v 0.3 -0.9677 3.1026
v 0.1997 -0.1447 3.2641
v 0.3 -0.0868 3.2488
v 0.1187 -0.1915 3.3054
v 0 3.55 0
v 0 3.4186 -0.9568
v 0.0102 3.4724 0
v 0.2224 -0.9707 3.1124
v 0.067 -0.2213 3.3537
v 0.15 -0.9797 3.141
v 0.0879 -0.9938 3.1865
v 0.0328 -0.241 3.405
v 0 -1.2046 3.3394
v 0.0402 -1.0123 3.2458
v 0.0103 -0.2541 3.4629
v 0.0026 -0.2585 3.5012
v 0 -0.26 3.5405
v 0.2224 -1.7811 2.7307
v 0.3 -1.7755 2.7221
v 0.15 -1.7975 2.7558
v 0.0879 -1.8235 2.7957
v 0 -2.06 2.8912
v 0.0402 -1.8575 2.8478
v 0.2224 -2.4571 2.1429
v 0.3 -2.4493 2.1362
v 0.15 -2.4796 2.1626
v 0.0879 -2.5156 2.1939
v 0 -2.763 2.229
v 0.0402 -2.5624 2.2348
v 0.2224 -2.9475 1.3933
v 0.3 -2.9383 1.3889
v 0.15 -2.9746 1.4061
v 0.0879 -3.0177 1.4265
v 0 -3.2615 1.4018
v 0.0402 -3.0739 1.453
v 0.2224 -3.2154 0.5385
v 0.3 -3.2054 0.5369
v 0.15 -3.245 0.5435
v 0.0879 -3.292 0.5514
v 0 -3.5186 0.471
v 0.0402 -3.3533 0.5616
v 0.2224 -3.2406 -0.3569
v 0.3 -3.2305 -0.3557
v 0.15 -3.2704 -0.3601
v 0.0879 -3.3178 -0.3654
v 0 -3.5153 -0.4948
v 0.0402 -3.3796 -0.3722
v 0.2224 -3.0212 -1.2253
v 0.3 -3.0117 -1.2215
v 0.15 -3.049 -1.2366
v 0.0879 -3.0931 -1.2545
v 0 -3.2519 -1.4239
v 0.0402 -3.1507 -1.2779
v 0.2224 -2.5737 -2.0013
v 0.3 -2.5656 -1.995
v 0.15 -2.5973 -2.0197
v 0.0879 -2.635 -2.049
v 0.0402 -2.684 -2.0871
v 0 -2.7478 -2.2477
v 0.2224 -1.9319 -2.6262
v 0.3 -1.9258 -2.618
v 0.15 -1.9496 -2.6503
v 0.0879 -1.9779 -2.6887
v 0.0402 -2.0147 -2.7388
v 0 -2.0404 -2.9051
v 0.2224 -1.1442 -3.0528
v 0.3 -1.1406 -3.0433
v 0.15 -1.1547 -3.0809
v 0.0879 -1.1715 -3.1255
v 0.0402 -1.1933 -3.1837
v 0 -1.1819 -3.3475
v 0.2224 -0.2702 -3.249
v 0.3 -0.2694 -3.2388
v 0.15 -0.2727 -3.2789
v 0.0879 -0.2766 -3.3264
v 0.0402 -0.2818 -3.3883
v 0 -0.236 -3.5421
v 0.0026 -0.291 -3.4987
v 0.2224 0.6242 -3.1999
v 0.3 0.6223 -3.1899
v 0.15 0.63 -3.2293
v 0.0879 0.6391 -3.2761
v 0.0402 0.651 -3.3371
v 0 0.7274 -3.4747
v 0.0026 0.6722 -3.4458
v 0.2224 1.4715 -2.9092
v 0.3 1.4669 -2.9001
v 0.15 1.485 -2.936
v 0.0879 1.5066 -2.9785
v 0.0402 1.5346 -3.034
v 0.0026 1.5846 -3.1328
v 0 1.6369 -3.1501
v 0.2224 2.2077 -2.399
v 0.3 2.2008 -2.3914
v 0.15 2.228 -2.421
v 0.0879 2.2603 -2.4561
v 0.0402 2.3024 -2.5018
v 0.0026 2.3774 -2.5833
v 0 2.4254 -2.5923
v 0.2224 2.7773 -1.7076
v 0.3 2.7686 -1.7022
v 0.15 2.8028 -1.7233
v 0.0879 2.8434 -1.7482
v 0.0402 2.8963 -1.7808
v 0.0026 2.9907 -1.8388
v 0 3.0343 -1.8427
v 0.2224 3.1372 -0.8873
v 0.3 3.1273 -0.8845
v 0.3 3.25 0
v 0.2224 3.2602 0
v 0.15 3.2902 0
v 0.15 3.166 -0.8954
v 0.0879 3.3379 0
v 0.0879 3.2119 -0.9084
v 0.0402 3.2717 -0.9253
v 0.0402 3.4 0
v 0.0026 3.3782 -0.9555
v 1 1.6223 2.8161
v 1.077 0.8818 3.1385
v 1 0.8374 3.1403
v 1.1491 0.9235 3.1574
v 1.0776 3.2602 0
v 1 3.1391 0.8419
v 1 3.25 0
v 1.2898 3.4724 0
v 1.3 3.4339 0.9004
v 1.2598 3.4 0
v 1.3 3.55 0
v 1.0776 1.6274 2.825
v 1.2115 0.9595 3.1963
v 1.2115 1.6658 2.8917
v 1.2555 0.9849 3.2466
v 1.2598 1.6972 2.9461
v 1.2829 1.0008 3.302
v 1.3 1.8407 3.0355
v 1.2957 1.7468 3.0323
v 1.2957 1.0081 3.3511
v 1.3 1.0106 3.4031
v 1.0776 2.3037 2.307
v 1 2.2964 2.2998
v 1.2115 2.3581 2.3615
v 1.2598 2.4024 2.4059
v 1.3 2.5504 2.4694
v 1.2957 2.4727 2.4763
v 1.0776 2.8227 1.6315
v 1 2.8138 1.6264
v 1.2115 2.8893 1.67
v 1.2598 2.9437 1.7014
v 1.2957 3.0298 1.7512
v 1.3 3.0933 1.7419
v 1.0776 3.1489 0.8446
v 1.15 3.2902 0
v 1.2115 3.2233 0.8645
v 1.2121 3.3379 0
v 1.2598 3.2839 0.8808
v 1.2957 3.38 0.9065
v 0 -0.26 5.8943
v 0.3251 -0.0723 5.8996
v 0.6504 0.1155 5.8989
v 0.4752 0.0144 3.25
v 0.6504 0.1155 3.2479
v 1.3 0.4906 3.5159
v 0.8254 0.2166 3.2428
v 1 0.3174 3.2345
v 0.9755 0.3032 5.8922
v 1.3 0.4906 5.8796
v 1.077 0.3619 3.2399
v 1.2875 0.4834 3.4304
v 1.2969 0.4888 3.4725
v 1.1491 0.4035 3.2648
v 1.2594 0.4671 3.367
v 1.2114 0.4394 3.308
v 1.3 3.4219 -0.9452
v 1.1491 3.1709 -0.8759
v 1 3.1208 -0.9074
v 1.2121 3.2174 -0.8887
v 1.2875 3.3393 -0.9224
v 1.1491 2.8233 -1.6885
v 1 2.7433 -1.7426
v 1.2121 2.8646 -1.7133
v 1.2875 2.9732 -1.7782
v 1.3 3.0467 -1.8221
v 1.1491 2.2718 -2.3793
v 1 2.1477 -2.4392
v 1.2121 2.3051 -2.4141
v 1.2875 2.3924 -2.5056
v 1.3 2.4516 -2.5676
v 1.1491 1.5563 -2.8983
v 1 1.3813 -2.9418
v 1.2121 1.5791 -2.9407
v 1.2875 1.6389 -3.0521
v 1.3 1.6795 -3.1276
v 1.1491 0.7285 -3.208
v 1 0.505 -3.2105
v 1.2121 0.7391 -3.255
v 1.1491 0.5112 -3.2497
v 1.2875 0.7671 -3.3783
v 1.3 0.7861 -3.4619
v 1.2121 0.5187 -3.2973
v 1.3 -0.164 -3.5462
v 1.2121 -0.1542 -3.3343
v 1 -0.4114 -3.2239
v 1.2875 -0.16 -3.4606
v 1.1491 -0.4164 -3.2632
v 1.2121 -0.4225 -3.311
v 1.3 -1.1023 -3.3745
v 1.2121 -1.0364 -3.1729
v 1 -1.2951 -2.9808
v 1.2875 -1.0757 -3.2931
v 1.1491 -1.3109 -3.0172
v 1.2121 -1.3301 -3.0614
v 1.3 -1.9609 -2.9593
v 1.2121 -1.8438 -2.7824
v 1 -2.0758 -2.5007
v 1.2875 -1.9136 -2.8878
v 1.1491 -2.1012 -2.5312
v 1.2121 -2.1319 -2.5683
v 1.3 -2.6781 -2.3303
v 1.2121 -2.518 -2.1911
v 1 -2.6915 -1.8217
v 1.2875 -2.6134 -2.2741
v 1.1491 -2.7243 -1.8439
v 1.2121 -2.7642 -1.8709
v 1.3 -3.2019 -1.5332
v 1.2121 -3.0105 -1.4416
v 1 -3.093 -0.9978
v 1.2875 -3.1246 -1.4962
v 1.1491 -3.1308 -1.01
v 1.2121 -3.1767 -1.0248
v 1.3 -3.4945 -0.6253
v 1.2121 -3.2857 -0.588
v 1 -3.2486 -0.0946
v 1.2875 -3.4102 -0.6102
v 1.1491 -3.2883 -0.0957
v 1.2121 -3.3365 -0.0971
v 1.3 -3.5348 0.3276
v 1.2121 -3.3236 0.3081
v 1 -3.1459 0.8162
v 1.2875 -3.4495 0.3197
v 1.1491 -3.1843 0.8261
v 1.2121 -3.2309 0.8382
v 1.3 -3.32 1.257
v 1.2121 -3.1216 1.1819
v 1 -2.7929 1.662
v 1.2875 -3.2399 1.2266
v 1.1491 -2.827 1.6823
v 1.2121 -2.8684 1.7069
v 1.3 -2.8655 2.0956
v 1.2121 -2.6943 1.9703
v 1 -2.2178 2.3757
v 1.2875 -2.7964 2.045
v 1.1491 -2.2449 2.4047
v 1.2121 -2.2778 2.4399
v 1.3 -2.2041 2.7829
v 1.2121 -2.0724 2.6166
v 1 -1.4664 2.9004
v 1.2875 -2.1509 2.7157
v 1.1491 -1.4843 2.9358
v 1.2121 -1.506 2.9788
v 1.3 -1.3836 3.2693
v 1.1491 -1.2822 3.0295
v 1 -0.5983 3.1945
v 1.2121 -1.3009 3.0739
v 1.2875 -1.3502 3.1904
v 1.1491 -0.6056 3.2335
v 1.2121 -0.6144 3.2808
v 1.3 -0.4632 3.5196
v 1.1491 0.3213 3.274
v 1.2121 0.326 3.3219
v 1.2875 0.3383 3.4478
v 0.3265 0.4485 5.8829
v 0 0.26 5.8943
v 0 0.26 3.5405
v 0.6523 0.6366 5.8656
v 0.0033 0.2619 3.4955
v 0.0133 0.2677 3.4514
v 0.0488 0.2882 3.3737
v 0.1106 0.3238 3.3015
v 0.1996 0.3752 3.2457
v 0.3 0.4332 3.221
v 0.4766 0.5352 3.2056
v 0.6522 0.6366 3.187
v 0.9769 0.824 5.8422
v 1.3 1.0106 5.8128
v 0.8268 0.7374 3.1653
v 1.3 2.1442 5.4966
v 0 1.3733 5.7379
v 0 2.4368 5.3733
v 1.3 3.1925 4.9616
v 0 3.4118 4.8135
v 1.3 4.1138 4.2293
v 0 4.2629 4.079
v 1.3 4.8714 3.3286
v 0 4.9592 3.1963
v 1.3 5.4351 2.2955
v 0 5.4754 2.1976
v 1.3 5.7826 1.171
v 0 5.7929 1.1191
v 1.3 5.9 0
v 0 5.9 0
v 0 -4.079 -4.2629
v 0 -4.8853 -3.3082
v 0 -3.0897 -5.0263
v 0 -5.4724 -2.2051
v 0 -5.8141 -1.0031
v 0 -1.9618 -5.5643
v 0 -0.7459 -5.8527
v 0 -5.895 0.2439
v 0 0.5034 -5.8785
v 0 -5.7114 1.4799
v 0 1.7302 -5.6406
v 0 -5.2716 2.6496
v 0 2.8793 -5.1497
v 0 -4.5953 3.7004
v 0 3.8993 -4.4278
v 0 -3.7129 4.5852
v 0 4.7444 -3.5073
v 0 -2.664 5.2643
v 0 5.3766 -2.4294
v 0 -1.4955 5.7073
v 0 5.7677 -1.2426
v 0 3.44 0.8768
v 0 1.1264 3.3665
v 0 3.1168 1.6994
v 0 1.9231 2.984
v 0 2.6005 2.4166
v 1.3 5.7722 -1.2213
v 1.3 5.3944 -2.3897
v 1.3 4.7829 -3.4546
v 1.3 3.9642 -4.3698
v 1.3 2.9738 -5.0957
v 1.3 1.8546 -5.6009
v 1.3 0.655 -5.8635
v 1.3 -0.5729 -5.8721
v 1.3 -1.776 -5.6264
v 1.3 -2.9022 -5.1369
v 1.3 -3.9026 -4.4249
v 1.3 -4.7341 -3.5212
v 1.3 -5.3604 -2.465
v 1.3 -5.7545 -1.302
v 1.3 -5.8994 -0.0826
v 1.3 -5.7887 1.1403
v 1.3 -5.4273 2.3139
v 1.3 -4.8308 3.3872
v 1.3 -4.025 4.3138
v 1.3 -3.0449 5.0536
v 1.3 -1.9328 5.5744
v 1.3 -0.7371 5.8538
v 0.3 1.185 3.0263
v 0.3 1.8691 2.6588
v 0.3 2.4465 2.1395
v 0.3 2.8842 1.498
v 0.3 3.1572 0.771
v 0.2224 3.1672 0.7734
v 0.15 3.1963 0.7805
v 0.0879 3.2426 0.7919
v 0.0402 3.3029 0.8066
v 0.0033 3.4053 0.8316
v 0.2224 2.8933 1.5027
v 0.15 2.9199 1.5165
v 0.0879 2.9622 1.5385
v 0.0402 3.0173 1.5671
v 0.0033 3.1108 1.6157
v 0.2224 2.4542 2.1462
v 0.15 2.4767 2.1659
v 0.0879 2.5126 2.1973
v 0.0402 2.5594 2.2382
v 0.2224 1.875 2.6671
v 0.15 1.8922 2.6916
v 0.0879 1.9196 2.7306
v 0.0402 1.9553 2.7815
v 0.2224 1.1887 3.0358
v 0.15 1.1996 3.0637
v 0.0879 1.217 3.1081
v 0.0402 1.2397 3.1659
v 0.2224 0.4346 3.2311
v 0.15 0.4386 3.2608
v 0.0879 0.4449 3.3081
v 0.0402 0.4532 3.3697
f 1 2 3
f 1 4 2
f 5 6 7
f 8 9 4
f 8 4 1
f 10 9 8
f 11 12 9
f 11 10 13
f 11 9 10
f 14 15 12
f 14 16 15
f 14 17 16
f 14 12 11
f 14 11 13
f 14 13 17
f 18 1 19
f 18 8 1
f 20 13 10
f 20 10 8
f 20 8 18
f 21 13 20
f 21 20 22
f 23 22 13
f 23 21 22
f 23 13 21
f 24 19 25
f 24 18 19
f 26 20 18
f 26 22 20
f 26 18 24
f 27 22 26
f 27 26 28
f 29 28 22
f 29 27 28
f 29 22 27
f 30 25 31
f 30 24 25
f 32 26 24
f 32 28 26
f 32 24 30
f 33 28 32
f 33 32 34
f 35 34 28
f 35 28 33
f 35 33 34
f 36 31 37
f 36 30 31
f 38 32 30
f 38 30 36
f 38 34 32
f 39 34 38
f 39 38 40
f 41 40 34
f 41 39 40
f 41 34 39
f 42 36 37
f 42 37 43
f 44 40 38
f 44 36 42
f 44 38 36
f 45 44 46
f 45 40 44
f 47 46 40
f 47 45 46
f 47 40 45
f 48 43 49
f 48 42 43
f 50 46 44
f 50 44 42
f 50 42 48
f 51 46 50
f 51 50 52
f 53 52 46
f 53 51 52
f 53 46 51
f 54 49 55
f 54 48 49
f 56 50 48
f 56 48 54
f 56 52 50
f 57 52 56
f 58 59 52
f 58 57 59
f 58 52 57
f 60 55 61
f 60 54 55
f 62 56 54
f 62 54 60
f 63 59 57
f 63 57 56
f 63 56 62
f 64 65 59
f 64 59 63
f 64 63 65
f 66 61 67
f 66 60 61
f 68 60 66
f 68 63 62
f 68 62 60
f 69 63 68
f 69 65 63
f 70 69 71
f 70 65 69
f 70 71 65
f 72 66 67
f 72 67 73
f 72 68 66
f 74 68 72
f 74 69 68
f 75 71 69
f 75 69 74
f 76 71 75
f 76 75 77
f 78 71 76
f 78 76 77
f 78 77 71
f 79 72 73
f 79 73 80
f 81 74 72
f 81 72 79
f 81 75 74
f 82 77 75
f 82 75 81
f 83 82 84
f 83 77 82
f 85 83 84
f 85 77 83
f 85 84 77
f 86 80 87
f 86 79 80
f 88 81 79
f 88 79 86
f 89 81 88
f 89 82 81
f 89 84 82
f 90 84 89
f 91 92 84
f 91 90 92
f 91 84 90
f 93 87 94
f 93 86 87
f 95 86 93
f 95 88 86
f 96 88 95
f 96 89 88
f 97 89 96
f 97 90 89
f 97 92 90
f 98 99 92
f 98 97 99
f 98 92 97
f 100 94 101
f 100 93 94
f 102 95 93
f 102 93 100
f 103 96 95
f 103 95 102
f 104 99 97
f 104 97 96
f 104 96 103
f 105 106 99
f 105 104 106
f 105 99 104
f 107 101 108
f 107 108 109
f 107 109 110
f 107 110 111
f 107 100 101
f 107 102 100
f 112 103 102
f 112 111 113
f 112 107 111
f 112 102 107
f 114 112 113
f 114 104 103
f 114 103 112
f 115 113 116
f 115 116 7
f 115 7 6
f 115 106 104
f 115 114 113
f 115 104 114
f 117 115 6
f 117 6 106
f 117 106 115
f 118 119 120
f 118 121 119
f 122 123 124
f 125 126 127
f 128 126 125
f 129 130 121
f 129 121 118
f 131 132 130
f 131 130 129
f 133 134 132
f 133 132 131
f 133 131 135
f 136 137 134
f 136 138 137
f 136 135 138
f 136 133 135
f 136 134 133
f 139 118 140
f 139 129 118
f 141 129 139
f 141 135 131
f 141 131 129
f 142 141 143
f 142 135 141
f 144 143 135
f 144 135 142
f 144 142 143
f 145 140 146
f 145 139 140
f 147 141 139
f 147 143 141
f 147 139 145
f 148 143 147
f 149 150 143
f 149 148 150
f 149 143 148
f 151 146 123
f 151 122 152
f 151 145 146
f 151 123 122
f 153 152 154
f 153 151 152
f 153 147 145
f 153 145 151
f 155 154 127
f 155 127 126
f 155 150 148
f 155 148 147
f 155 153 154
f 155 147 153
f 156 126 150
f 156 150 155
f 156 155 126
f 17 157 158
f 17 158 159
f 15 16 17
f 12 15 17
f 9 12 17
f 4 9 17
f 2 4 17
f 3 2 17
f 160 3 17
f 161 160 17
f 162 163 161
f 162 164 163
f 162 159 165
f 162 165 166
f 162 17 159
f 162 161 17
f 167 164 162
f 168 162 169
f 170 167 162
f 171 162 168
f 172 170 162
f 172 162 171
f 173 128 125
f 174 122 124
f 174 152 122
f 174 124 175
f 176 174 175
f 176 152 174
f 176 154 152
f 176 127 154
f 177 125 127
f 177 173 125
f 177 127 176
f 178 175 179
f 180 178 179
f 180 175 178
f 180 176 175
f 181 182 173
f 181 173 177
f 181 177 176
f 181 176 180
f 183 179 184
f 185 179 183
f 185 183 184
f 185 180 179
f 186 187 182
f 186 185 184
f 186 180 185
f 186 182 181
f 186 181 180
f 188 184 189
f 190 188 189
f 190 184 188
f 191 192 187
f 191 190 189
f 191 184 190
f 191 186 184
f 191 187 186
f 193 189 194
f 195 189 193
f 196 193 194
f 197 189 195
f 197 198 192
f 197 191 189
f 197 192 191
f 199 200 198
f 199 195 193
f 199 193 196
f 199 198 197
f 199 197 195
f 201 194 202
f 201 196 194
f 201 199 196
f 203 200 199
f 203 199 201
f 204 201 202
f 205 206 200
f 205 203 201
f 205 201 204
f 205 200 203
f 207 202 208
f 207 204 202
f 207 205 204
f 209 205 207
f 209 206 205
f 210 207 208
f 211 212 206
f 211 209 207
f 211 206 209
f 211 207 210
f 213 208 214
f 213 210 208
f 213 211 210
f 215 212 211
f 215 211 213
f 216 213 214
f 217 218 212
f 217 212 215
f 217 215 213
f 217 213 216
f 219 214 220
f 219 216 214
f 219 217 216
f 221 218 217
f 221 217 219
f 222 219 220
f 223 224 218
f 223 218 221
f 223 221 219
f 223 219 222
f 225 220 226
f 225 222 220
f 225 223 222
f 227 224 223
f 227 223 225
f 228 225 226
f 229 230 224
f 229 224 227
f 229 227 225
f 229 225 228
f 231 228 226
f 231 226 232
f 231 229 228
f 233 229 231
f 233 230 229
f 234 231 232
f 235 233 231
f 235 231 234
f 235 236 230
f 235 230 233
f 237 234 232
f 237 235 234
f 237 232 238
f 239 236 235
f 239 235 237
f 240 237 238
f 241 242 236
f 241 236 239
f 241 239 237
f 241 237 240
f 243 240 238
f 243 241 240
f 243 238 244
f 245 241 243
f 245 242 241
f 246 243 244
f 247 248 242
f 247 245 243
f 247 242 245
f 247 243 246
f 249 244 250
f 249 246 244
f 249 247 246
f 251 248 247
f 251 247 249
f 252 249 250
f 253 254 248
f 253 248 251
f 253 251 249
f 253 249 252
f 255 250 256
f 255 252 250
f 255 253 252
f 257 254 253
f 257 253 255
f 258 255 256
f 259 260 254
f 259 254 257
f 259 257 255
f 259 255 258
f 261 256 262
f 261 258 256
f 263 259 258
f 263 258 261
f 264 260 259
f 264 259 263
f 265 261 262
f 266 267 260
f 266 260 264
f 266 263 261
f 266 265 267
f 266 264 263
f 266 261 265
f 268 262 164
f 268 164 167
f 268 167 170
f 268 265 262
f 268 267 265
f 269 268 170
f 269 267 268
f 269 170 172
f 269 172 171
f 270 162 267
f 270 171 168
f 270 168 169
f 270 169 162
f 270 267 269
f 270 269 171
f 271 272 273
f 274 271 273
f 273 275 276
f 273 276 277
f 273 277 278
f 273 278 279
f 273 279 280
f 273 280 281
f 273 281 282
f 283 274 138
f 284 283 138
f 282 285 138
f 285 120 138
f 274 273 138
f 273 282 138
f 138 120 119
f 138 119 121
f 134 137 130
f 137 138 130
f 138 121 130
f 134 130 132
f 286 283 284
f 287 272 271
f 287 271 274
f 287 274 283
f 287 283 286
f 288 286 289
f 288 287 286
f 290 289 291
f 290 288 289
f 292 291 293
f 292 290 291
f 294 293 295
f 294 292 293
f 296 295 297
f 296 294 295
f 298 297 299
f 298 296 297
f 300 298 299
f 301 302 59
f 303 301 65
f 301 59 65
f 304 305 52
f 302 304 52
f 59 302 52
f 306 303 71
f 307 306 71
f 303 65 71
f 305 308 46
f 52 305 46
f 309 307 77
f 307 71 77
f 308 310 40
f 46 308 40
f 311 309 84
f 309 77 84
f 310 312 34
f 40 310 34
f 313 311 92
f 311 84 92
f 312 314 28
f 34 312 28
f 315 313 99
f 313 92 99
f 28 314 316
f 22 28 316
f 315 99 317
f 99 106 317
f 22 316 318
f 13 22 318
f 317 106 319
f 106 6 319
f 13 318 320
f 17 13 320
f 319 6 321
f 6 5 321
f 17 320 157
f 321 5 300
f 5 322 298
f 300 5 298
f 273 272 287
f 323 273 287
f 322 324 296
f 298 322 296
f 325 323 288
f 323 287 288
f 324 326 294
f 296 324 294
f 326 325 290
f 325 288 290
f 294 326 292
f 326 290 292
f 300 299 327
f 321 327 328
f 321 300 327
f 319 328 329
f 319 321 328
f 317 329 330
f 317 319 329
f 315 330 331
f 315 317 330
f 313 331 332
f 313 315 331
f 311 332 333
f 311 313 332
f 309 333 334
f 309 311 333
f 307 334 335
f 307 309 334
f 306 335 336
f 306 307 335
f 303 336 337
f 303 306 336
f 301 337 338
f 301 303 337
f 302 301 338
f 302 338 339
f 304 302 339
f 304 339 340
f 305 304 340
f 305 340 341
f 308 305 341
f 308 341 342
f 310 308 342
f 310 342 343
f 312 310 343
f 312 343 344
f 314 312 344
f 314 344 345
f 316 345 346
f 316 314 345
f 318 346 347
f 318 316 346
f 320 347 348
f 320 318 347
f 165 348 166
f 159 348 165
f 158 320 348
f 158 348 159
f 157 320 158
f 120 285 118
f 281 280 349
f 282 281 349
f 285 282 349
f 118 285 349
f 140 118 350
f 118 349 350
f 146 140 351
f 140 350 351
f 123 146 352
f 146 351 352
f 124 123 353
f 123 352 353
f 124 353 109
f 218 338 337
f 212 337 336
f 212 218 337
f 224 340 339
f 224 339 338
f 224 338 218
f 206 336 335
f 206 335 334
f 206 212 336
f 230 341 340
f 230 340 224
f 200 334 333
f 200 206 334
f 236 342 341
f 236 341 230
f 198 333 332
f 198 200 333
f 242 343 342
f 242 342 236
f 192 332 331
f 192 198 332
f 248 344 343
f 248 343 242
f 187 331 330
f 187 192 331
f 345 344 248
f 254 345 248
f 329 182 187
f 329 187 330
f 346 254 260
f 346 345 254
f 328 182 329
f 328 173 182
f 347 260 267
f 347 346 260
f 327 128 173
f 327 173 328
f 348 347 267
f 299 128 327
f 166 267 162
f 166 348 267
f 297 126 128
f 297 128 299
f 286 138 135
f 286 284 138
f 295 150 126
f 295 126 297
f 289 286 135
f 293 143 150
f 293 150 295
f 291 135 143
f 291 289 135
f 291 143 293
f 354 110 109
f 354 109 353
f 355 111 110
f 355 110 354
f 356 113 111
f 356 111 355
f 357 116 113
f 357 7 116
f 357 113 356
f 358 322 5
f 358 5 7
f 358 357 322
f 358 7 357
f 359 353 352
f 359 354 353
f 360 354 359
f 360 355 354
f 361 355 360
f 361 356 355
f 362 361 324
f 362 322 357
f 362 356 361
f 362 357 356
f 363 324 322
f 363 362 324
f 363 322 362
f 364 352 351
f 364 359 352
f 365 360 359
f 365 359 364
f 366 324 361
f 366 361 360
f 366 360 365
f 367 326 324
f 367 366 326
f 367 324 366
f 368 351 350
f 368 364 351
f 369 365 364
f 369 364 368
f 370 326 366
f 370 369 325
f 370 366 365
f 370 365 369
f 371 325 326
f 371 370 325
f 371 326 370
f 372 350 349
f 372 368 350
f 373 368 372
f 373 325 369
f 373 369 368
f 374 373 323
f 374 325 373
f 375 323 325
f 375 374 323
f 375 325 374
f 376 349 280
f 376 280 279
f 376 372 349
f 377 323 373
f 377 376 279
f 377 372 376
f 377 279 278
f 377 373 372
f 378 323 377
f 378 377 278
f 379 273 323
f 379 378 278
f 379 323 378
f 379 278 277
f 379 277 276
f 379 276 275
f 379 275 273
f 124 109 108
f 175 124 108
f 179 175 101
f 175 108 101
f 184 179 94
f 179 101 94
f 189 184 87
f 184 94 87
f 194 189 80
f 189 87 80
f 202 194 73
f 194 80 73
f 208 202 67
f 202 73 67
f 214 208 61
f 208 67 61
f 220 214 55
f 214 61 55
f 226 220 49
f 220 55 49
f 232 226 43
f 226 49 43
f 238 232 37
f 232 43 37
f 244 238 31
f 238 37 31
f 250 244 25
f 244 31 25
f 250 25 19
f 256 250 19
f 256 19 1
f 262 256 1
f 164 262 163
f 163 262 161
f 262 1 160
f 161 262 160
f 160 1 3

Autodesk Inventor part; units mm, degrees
ref_plane "YZ Plane" through (0, 0, 0) normal (1, 0, 0) x (0, 1, 0)
ref_plane "XZ Plane" through (0, 0, 0) normal (0, 1, 0) x (-1, 0, 0)
sketch "Sketch1" plane through (0, 0, 0) normal (1, 0, 0) x (0, 1, 0)
  circle A0 centre (0, 0) radius 5.9
  circle A1 centre (0, 0) radius 3.25
  dimension "d0" = 6.5
  dimension "d1" = 11.8
extrude "Body" add sketch "Sketch1" along normal blind 1.3
fillet "Fillet" radius 0.3 2 edges at (1.3, -3.25, 0) (0, -3.25, 0)
sketch "Sketch2" plane through (0, 0, 0) normal (0, 0, 1) x (1, 0, 0)
  line L0 (0, -3.25) -> (0, 3.25) projected
  line L1 (1.3, 5.9) -> (1.3, -5.9) projected
  line L2 (-1.2, 0) -> (7.2, 0) projected
  line L3 (0, -0.26) -> (1.3, 0.4906)
  line L4 (0, 0.26) -> (1.3, 1.0106)
  dimension "d4" = 0.26
  dimension "d5" = 0.26
  dimension "d6" = 60
extrude "Cut" cut sketch "Sketch2" along normal up to next contours L0 L2 L3 | L0 L4 L1 L3 L2
ref_plane "Work Plane1" through (0, 0, 0) normal (0, -1, 0) x (1, 0, 0)
equation "\"d0\" = SD1"
equation "\"d1\" = SD2"
equation "\"d2\" = SD"
equation "\"d4\" = 0.2 * SD"
equation "\"d5\" = 0.2 * SD"
equation "\"d6\" = FAWI"
equation "\"d7\" = SD"
equation "\"d13\" = R"
equation "\"SD1\" = 6.5"
equation "\"SD2\" = 11.8"
equation "\"SD\" = 1.3"
equation "\"FAWI\" = 60deg"
equation "\"R\" = 0.3"
equation "\"NND\" = 6"
properties part number "DIN 128 - A6" material "Steel, Mild"
